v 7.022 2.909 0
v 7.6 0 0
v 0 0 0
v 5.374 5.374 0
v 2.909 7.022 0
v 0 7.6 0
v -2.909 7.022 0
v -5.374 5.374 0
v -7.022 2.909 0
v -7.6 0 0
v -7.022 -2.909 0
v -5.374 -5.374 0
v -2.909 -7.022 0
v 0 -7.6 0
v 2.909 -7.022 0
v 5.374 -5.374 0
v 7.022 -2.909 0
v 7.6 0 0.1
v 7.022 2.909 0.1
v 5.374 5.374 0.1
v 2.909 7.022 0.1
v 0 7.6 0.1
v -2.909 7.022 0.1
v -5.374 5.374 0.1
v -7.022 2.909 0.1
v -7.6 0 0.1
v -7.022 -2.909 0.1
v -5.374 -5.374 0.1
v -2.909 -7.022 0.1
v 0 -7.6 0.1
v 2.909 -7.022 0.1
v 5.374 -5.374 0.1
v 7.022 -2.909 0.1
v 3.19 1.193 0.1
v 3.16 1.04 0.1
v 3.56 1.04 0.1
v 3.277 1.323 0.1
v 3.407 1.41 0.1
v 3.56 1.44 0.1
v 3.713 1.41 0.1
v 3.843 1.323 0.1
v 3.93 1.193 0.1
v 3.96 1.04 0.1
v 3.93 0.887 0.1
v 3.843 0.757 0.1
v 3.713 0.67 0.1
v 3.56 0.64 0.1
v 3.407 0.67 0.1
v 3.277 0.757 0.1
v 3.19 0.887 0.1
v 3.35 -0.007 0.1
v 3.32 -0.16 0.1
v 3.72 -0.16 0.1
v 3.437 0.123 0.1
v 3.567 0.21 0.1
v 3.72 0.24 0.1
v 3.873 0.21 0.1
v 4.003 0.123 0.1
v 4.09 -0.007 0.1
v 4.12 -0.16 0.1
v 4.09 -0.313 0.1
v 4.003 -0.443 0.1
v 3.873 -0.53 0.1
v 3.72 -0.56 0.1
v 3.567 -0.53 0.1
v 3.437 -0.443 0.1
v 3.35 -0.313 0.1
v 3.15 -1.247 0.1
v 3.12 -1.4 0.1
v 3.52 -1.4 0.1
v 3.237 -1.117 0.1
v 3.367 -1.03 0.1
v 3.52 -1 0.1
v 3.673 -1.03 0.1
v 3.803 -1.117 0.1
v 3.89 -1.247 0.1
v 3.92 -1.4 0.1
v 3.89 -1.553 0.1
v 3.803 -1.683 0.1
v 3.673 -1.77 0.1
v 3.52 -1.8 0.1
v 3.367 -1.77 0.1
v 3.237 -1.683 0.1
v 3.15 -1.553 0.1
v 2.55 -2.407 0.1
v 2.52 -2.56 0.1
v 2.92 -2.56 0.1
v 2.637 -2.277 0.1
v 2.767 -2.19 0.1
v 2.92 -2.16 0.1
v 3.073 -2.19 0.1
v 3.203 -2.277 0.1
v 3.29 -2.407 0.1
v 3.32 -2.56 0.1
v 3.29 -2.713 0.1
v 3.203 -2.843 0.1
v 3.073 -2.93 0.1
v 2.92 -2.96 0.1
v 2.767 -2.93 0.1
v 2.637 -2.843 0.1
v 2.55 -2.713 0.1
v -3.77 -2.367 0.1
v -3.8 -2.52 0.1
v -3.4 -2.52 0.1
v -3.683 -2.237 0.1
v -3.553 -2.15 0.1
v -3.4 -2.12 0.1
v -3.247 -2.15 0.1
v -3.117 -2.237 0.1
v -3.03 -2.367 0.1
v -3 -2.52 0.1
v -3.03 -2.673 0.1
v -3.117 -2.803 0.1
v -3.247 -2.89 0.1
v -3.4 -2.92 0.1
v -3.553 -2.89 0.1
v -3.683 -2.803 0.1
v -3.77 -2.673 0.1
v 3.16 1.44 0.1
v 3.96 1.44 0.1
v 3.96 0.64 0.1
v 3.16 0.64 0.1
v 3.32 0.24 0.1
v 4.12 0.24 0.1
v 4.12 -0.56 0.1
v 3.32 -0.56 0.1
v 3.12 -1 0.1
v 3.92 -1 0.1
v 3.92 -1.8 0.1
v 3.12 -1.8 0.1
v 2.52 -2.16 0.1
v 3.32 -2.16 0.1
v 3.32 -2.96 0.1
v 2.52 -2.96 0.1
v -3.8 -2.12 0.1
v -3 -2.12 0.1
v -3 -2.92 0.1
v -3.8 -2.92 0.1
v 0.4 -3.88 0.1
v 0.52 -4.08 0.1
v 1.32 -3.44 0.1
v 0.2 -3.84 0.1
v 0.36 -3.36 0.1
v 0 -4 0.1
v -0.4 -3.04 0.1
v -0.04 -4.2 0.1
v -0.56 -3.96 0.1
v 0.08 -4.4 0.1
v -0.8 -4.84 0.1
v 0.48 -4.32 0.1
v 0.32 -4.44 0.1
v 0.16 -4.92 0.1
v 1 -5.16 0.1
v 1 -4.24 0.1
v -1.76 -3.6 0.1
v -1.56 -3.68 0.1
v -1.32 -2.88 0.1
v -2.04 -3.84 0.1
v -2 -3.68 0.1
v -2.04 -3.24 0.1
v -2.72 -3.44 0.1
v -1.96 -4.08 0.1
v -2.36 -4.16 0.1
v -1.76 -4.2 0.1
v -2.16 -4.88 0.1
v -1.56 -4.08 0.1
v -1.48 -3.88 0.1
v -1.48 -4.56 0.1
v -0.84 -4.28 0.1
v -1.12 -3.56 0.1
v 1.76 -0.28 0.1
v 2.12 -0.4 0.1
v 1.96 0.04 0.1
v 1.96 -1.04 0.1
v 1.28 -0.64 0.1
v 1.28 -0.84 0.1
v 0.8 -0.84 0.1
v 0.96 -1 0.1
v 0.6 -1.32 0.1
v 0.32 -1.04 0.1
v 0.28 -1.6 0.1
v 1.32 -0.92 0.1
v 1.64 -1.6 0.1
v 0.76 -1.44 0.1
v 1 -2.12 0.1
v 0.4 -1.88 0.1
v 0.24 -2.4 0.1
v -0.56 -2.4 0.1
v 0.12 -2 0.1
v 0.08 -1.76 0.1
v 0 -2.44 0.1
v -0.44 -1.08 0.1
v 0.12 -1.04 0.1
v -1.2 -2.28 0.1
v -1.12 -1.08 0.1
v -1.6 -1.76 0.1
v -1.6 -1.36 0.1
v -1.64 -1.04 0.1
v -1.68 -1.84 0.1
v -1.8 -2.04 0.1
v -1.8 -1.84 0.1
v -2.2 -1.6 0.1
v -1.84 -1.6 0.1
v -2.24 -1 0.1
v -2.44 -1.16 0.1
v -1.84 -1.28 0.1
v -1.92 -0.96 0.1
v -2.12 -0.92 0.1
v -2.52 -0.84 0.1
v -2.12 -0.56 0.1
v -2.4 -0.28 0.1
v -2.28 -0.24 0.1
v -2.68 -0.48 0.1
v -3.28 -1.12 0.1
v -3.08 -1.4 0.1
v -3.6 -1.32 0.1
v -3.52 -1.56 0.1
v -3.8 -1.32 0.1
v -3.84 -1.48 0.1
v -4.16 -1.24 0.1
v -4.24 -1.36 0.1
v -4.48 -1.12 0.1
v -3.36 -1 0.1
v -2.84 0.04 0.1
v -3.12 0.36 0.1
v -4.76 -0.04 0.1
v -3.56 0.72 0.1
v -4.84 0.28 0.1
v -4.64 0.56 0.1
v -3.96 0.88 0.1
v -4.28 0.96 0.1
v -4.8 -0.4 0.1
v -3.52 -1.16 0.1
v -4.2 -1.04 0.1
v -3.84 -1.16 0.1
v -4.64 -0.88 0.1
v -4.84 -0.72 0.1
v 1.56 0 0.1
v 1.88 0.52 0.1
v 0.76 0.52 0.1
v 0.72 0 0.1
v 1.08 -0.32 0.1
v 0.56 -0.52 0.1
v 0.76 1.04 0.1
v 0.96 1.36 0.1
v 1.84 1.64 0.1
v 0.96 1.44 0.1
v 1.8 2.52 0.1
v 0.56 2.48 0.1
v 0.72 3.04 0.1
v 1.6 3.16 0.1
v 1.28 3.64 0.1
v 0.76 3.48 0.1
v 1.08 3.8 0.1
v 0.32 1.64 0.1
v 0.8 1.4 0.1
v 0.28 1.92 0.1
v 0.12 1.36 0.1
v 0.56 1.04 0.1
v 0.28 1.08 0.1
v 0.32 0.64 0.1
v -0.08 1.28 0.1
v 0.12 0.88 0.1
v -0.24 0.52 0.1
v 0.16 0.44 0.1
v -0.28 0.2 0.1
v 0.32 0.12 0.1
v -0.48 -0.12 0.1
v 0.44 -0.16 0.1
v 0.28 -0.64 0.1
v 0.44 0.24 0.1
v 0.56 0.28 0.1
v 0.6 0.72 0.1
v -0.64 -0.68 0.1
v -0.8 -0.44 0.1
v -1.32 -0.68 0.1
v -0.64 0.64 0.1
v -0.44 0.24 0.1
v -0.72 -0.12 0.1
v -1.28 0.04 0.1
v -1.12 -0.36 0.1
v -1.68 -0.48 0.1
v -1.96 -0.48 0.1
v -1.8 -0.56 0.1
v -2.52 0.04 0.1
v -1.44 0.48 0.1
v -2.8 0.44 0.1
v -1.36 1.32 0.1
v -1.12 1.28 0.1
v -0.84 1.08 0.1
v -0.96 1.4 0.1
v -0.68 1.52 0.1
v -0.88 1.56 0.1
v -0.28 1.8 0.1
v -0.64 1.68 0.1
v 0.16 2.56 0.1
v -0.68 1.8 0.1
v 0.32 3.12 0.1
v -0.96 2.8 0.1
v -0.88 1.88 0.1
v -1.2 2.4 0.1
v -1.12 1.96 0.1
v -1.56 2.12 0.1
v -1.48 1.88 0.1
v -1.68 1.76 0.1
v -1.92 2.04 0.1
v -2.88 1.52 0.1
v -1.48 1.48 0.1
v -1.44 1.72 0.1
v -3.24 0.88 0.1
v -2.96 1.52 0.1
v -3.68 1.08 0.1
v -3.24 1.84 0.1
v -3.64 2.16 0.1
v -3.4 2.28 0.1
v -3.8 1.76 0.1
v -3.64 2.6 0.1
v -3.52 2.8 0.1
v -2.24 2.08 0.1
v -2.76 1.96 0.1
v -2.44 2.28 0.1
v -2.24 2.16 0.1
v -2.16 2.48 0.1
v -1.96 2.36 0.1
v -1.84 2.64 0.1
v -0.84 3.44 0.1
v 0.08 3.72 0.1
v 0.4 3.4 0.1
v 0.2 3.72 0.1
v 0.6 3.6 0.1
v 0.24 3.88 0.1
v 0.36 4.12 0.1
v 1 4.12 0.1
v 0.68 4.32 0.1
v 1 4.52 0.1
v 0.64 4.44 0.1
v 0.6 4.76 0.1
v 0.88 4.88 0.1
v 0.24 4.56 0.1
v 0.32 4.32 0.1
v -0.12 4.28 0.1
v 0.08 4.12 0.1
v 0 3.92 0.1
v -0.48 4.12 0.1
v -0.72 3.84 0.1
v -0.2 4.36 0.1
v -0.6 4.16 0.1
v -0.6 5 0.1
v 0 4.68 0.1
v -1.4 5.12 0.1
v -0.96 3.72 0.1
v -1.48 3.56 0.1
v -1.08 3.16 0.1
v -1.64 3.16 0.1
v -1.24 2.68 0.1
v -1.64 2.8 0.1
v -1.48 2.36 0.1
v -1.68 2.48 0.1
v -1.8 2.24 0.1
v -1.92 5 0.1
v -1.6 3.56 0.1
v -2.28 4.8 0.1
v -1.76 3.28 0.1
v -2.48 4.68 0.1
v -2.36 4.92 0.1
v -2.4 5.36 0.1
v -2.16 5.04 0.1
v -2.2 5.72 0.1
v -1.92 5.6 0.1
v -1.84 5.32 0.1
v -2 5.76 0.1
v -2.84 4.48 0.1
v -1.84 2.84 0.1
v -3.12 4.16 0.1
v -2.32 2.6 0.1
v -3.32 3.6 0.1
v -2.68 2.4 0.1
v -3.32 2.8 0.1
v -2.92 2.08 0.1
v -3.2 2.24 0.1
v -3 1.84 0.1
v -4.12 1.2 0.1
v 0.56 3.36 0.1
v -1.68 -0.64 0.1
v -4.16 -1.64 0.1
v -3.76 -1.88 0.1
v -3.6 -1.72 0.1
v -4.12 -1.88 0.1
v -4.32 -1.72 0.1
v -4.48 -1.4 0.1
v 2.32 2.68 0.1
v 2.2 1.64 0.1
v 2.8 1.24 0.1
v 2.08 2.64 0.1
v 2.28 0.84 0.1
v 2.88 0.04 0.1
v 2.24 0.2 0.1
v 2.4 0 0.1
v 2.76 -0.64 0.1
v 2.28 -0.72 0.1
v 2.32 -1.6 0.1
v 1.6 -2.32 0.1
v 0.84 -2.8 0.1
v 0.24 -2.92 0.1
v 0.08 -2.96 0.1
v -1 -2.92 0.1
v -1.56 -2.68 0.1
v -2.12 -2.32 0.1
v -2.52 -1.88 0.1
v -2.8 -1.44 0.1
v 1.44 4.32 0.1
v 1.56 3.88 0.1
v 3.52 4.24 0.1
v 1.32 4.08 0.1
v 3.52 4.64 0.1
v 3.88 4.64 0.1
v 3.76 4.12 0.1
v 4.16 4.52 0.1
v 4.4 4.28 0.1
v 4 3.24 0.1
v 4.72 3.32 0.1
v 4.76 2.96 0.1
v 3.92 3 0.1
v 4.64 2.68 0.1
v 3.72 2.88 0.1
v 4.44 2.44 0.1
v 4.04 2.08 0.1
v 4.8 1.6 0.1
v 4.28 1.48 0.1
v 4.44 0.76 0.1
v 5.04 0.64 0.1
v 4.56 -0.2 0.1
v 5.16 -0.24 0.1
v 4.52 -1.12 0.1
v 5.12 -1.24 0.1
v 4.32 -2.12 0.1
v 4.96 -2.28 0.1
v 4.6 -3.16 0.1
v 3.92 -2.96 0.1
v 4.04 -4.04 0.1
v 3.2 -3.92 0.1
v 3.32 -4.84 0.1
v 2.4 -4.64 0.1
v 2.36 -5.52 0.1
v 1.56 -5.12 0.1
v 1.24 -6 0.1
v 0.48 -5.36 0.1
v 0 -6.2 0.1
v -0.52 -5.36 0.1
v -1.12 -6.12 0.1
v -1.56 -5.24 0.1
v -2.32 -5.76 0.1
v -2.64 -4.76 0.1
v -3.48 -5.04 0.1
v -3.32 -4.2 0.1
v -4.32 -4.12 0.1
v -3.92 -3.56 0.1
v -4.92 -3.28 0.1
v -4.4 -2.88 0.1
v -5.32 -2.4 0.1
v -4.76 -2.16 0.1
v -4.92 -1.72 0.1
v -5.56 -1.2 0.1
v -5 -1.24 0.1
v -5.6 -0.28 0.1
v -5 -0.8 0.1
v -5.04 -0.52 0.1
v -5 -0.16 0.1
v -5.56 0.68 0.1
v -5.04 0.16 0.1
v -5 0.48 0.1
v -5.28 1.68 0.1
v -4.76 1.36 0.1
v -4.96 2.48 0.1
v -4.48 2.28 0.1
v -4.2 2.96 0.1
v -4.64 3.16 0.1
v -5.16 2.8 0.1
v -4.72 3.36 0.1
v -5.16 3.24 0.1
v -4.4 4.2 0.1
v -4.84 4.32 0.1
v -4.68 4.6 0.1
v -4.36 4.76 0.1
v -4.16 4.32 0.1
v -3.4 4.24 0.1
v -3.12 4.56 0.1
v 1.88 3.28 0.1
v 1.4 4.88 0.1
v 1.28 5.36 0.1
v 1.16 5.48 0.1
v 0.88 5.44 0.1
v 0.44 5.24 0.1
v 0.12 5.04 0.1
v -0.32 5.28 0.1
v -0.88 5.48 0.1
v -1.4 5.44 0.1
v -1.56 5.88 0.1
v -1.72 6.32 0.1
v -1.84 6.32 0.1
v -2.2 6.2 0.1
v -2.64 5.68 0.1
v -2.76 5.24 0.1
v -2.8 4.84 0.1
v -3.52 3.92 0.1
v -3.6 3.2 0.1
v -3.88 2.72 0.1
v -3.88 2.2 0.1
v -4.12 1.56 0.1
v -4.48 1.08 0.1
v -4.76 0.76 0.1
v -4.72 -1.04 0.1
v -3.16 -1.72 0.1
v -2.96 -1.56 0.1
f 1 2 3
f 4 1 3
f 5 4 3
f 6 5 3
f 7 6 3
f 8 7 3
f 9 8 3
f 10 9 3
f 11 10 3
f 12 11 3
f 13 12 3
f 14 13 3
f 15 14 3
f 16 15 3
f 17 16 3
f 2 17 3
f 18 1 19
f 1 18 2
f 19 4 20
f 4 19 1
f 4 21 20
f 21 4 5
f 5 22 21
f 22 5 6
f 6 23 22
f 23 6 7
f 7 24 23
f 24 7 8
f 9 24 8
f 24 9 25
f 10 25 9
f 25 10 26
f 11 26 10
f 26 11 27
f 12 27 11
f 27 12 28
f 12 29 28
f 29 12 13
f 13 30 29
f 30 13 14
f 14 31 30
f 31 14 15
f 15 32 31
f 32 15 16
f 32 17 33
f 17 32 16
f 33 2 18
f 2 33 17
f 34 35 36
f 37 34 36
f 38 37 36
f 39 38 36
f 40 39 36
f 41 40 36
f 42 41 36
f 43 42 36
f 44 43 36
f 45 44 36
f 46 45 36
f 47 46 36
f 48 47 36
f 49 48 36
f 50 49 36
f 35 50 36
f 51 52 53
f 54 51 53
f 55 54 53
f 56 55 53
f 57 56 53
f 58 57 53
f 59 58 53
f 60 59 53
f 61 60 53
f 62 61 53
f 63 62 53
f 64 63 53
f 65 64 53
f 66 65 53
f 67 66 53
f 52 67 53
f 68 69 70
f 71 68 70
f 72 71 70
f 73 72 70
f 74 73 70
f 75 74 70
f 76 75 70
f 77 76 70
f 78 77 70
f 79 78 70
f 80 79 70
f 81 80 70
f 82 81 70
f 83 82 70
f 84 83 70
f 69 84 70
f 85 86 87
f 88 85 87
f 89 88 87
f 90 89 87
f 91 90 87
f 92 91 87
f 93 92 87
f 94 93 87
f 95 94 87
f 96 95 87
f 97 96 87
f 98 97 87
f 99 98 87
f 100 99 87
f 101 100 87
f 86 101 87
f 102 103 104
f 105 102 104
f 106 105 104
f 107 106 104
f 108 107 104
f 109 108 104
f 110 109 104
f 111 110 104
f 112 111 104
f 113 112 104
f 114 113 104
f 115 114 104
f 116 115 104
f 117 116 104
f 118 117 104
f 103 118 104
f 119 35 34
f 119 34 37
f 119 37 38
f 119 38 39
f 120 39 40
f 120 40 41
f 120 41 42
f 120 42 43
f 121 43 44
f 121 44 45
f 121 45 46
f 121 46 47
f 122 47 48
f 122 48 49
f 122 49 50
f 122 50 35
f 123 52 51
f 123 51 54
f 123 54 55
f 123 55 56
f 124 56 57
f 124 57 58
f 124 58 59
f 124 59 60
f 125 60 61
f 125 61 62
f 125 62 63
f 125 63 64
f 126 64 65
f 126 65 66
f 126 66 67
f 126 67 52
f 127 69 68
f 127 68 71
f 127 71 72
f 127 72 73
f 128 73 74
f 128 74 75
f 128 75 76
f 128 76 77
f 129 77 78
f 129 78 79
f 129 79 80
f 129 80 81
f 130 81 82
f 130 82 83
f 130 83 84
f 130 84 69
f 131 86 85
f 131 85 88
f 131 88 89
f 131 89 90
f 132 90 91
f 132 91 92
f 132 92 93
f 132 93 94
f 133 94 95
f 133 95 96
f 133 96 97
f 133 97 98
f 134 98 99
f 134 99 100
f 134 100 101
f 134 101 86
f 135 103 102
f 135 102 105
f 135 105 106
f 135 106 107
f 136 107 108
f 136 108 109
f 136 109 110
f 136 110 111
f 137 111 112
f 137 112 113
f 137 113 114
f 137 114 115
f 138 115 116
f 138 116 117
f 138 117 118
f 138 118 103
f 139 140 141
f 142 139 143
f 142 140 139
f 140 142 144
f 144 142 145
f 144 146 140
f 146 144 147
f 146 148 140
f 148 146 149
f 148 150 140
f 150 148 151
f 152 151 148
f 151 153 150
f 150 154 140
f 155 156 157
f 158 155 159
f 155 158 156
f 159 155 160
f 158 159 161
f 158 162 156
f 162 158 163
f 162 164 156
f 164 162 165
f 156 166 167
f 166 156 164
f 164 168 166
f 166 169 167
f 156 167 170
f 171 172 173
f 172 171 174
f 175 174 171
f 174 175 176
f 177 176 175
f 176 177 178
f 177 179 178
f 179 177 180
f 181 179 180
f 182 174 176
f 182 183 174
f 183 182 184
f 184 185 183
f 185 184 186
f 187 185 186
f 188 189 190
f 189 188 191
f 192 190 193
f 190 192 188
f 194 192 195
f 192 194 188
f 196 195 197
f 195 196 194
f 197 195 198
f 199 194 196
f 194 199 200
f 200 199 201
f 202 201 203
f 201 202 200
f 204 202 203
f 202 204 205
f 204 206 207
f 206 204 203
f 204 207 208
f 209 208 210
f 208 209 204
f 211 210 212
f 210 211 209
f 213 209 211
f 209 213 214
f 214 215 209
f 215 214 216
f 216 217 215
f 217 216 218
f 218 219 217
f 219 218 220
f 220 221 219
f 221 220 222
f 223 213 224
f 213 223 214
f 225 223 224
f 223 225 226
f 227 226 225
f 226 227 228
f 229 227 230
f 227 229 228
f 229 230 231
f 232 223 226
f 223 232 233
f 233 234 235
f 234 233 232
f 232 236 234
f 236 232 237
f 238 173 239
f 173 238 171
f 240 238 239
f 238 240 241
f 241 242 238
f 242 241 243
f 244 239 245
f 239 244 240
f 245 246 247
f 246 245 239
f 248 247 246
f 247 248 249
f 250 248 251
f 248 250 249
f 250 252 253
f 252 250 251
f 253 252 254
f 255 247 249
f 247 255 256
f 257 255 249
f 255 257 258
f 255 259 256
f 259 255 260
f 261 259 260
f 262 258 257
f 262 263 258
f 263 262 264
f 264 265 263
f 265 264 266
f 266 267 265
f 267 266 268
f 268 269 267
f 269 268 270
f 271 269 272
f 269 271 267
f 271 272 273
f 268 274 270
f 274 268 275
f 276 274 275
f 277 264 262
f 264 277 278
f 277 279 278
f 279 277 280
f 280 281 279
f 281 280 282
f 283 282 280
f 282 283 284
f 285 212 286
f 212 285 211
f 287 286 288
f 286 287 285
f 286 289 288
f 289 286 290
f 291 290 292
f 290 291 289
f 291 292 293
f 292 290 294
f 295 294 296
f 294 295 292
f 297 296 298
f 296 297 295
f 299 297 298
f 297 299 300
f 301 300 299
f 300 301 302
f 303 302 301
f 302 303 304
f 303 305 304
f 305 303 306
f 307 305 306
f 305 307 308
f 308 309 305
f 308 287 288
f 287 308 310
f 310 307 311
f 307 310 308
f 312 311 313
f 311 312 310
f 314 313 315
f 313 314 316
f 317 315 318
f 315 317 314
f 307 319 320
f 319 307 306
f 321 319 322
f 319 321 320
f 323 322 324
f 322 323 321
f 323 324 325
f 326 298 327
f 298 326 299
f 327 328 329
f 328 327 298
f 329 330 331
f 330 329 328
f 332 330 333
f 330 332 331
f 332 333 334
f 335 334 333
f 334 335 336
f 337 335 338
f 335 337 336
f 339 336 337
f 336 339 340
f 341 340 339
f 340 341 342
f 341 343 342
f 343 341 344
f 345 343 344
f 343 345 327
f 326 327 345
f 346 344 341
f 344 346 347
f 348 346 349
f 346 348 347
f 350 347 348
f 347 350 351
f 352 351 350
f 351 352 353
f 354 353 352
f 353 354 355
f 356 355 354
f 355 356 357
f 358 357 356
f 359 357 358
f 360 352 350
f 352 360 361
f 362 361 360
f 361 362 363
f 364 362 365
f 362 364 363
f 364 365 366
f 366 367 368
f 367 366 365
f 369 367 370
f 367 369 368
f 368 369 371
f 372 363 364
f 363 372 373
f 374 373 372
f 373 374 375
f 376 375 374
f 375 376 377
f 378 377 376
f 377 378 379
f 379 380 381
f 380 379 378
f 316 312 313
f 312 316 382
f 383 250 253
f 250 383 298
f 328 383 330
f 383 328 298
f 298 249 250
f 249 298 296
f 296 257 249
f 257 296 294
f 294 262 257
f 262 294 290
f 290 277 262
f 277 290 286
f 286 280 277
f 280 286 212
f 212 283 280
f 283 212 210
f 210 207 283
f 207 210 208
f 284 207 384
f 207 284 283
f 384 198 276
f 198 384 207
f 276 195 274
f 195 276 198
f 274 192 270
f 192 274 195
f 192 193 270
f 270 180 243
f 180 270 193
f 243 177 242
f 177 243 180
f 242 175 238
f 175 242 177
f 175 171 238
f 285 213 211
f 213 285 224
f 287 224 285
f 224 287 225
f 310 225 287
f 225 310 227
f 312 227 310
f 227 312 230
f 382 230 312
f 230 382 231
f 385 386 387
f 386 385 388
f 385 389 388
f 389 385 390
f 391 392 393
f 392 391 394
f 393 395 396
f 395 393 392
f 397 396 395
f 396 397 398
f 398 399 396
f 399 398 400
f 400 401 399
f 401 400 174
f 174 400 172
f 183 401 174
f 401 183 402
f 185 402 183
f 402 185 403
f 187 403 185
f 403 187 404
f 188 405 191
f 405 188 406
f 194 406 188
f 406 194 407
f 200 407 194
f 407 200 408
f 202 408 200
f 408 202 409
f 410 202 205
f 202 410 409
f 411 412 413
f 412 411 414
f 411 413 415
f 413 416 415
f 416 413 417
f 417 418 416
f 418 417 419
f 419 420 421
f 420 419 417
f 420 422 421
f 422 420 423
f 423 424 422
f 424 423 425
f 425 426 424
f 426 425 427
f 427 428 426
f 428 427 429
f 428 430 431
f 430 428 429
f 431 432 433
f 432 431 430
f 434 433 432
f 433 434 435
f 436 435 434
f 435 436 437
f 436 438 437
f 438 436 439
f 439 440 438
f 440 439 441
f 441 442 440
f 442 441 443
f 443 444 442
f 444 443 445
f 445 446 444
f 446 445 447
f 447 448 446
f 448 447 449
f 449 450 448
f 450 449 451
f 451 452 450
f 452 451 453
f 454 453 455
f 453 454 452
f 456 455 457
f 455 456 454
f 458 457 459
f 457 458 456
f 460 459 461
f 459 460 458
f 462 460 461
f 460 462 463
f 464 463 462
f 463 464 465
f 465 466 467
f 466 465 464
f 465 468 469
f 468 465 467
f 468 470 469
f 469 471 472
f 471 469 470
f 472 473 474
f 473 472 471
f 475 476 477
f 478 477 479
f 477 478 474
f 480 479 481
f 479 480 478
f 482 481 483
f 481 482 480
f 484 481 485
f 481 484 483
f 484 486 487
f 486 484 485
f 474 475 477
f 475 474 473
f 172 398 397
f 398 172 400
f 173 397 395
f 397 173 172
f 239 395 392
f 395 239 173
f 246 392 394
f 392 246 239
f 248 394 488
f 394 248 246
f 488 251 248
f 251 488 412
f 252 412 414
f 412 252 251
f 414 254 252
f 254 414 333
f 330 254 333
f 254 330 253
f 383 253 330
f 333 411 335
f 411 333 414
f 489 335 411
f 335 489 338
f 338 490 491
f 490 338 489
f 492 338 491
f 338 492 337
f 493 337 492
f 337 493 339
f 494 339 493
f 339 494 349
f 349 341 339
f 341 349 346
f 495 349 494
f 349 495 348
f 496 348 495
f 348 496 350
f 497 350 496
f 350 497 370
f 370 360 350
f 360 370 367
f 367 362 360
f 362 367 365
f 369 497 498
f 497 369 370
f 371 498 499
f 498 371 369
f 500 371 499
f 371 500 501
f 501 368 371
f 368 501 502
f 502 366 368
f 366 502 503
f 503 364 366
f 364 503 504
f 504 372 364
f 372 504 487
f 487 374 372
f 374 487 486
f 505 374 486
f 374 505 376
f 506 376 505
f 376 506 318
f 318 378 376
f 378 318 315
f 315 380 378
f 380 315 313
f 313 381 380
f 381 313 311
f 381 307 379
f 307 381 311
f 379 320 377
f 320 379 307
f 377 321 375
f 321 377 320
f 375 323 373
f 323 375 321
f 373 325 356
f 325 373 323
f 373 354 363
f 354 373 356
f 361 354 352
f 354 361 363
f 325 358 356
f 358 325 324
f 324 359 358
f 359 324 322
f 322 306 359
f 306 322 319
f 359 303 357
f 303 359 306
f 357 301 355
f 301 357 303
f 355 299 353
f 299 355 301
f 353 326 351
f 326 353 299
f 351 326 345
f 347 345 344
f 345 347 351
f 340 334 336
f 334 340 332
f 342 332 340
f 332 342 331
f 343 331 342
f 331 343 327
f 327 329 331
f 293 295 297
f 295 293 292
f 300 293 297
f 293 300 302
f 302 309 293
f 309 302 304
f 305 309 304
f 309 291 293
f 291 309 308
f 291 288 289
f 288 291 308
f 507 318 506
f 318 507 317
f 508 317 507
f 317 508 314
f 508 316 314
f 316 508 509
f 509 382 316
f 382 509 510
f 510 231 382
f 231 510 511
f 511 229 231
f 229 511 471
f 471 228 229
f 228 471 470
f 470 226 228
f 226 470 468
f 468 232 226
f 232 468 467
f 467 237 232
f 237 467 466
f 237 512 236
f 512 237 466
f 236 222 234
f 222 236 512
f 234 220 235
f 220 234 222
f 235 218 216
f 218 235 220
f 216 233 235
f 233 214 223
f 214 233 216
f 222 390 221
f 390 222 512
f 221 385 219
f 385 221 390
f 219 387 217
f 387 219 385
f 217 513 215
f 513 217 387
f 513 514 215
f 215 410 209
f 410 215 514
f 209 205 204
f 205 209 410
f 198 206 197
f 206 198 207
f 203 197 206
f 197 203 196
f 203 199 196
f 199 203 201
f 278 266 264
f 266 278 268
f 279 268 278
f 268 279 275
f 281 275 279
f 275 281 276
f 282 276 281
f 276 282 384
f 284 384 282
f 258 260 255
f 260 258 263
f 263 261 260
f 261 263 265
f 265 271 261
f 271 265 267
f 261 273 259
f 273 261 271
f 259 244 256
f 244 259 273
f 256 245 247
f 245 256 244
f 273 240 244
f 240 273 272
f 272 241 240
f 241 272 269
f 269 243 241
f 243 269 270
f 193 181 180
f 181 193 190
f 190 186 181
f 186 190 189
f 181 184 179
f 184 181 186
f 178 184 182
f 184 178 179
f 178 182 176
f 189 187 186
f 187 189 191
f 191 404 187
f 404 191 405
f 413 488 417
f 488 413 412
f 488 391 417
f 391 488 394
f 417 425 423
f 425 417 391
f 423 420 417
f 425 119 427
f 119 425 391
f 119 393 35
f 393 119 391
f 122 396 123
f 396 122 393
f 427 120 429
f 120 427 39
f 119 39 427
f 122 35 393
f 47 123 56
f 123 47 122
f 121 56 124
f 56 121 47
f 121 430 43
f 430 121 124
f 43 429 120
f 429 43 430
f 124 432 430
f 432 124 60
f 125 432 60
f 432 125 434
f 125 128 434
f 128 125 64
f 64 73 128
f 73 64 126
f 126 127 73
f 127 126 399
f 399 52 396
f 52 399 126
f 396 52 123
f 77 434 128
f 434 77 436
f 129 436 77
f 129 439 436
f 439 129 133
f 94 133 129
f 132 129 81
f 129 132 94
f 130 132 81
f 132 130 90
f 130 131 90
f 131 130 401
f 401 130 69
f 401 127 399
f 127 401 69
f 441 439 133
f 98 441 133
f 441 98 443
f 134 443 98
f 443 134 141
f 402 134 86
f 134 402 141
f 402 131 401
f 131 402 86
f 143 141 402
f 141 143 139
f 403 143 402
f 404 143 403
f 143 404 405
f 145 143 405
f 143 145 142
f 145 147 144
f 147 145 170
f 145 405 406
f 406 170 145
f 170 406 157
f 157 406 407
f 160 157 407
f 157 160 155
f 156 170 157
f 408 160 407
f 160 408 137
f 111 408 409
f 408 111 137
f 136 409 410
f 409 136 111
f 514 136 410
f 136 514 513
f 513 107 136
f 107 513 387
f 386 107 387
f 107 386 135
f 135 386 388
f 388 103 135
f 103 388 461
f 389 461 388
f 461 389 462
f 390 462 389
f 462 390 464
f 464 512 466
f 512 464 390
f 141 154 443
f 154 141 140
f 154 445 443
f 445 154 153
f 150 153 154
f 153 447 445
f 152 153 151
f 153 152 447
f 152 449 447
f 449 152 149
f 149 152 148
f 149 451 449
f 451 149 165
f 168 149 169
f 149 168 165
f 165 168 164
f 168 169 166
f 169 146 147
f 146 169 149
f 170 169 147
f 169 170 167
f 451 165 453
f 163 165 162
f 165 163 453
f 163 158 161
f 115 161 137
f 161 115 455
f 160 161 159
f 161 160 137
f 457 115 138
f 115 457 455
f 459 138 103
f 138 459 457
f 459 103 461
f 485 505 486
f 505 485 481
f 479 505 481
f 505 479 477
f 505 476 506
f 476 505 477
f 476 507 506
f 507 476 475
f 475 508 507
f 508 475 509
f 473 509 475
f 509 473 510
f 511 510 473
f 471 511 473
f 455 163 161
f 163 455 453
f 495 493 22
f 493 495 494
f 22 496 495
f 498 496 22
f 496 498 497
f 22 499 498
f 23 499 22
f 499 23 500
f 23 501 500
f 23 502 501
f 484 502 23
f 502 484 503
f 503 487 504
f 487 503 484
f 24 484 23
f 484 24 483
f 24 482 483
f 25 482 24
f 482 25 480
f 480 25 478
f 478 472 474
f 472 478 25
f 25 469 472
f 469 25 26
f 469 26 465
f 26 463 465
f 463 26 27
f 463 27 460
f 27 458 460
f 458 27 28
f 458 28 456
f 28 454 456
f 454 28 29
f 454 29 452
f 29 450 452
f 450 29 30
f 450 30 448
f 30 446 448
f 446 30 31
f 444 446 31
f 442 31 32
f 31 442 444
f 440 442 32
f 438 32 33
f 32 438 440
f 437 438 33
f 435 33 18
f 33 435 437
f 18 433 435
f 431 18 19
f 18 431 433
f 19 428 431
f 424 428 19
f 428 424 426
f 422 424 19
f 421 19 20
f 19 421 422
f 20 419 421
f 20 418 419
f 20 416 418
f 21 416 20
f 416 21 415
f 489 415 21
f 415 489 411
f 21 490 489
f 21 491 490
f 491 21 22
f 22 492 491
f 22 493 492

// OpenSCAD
use <../lib.scad>
use <../p/4-4cylc3.scad>
use <../p/4-4ering.scad>
use <s/4650854ds01.scad>
function ldraw_lib__4650854g() = [
// 0 Sticker  1.9 x  1.9 Round with Horse Head in Horseshoe
// 0 Name: 4650854g.dat
// 0 Author: Takeshi Takahashi [RainbowDolphin]
// 0 !LDRAW_ORG Part UPDATE 2024-08
// 0 !LICENSE Licensed under CC BY 4.0 : see CAreadme.txt
// 
// 0 BFC CERTIFY CCW
  [0,"BFC","CERTIFY"],
  [0,"BFC","CCW"],
// 
// 0 !KEYWORDS Bricklink 3185stk01, Brickowl 384632, camp, Rebrickable 10099435
// 0 !KEYWORDS Riding, Set 3185, Stable
// 
// 0 !HISTORY 2024-09-30 [OrionP] Official Update 2024-08
// 
// 1 16 0 0 0 19 0 0 0 -0.25 0 0 0 19 4-4cylc3.dat
  [1,16,0,0,0,19,0,0,0,-0.25,0,0,0,19, ldraw_lib__4_4cylc3()],
// 1 30 0 -.25 0 19 0 0 0 1 0 0 0 19 4-4ering.dat
  [1,30,0,-.25,0,19,0,0,0,1,0,0,0,19, ldraw_lib__4_4ering()],
// 1 16 0 -.25 0 -1 0 0 0 1 0 0 0 1 s\4650854ds01.dat
  [1,16,0,-.25,0,-1,0,0,0,1,0,0,0,1, ldraw_lib__s__4650854ds01()],
// 4 30 0 -.25 19 -.8 -.25 13.2 .3 -.25 12.6 1.1 -.25 13.1
  [4,30,0,-.25,19,-.8,-.25,13.2,.3,-.25,12.6,1.1,-.25,13.1],
// 3 30 0 -.25 19 -2.2 -.25 13.7 -.8 -.25 13.2
  [3,30,0,-.25,19,-2.2,-.25,13.7,-.8,-.25,13.2],
// 4 30 -3.5 -.25 13.6 -2.2 -.25 13.7 0 -.25 19 -3.9 -.25 14.7
  [4,30,-3.5,-.25,13.6,-2.2,-.25,13.7,0,-.25,19,-3.9,-.25,14.7],
// 3 30 0 -.25 19 -4.3 -.25 15.8 -3.9 -.25 14.7
  [3,30,0,-.25,19,-4.3,-.25,15.8,-3.9,-.25,14.7],
// 4 30 -4.6 -.25 15.8 -4.3 -.25 15.8 0 -.25 19 -7.2713 -.25 17.5541
  [4,30,-4.6,-.25,15.8,-4.3,-.25,15.8,0,-.25,19,-7.2713,-.25,17.5541],
// 3 30 -7.2713 -.25 17.5541 -5.5 -.25 15.5 -4.6 -.25 15.8
  [3,30,-7.2713,-.25,17.5541,-5.5,-.25,15.5,-4.6,-.25,15.8],
// 3 30 -7.2713 -.25 17.5541 -6.6 -.25 14.2 -5.5 -.25 15.5
  [3,30,-7.2713,-.25,17.5541,-6.6,-.25,14.2,-5.5,-.25,15.5],
// 4 30 -6.9 -.25 13.1 -6.6 -.25 14.2 -7.2713 -.25 17.5541 -10.9 -.25 11.9
  [4,30,-6.9,-.25,13.1,-6.6,-.25,14.2,-7.2713,-.25,17.5541,-10.9,-.25,11.9],
// 4 30 -7 -.25 12.1 -6.9 -.25 13.1 -10.9 -.25 11.9 -7.8 -.25 11.4
  [4,30,-7,-.25,12.1,-6.9,-.25,13.1,-10.9,-.25,11.9,-7.8,-.25,11.4],
// 4 30 -10.9 -.25 11.9 -7.2713 -.25 17.5541 -13.4349 -.25 13.4349 -11.7 -.25 11.5
  [4,30,-10.9,-.25,11.9,-7.2713,-.25,17.5541,-13.4349,-.25,13.4349,-11.7,-.25,11.5],
// 3 30 -13.4349 -.25 13.4349 -12.1 -.25 10.8 -11.7 -.25 11.5
  [3,30,-13.4349,-.25,13.4349,-12.1,-.25,10.8,-11.7,-.25,11.5],
// 4 30 -12.9 -.25 8.1 -12.1 -.25 10.8 -13.4349 -.25 13.4349 -17.5541 -.25 7.2713
  [4,30,-12.9,-.25,8.1,-12.1,-.25,10.8,-13.4349,-.25,13.4349,-17.5541,-.25,7.2713],
// 3 30 -12.9 -.25 8.1 -17.5541 -.25 7.2713 -12.9 -.25 7
  [3,30,-12.9,-.25,8.1,-17.5541,-.25,7.2713,-12.9,-.25,7],
// 4 30 -12.4 -.25 6.2 -12.9 -.25 7 -17.5541 -.25 7.2713 -13.2 -.25 4.2
  [4,30,-12.4,-.25,6.2,-12.9,-.25,7,-17.5541,-.25,7.2713,-13.2,-.25,4.2],
// 4 30 -13.9 -.25 1.7 -13.2 -.25 4.2 -17.5541 -.25 7.2713 -19 -.25 0
  [4,30,-13.9,-.25,1.7,-13.2,-.25,4.2,-17.5541,-.25,7.2713,-19,-.25,0],
// 3 30 -13.9 -.25 1.7 -19 -.25 0 -14 -.25 -.7
  [3,30,-13.9,-.25,1.7,-19,-.25,0,-14,-.25,-.7],
// 4 30 -13.9 -.25 -3 -14 -.25 -.7 -19 -.25 0 -17.5541 -.25 -7.2713
  [4,30,-13.9,-.25,-3,-14,-.25,-.7,-19,-.25,0,-17.5541,-.25,-7.2713],
// 3 30 -13.9 -.25 -3 -17.5541 -.25 -7.2713 -13.3 -.25 -6
  [3,30,-13.9,-.25,-3,-17.5541,-.25,-7.2713,-13.3,-.25,-6],
// 4 30 -12.3 -.25 -8.2 -13.3 -.25 -6 -17.5541 -.25 -7.2713 -13.4349 -.25 -13.4349
  [4,30,-12.3,-.25,-8.2,-13.3,-.25,-6,-17.5541,-.25,-7.2713,-13.4349,-.25,-13.4349],
// 3 30 -12.3 -.25 -8.2 -13.4349 -.25 -13.4349 -10.8 -.25 -10.3
  [3,30,-12.3,-.25,-8.2,-13.4349,-.25,-13.4349,-10.8,-.25,-10.3],
// 4 30 -8.7 -.25 -12.6 -10.8 -.25 -10.3 -13.4349 -.25 -13.4349 -7.2713 -.25 -17.5541
  [4,30,-8.7,-.25,-12.6,-10.8,-.25,-10.3,-13.4349,-.25,-13.4349,-7.2713,-.25,-17.5541],
// 3 30 -8.7 -.25 -12.6 -7.2713 -.25 -17.5541 -5.8 -.25 -14.4
  [3,30,-8.7,-.25,-12.6,-7.2713,-.25,-17.5541,-5.8,-.25,-14.4],
// 4 30 -2.8 -.25 -15.3 -5.8 -.25 -14.4 -7.2713 -.25 -17.5541 0 -.25 -19
  [4,30,-2.8,-.25,-15.3,-5.8,-.25,-14.4,-7.2713,-.25,-17.5541,0,-.25,-19],
// 3 30 -2.8 -.25 -15.3 0 -.25 -19 0 -.25 -15.5
  [3,30,-2.8,-.25,-15.3,0,-.25,-19,0,-.25,-15.5],
// 4 30 3.1 -.25 -15 0 -.25 -15.5 0 -.25 -19 7.2713 -.25 -17.5541
  [4,30,3.1,-.25,-15,0,-.25,-15.5,0,-.25,-19,7.2713,-.25,-17.5541],
// 3 30 5.9 -.25 -13.8 3.1 -.25 -15 7.2713 -.25 -17.5541
  [3,30,5.9,-.25,-13.8,3.1,-.25,-15,7.2713,-.25,-17.5541],
// 4 30 8.3 -.25 -12.1 5.9 -.25 -13.8 7.2713 -.25 -17.5541 13.4349 -.25 -13.4349
  [4,30,8.3,-.25,-12.1,5.9,-.25,-13.8,7.2713,-.25,-17.5541,13.4349,-.25,-13.4349],
// 3 30 10.1 -.25 -10.1 8.3 -.25 -12.1 13.4349 -.25 -13.4349
  [3,30,10.1,-.25,-10.1,8.3,-.25,-12.1,13.4349,-.25,-13.4349],
// 4 30 11.5 -.25 -7.9 10.1 -.25 -10.1 13.4349 -.25 -13.4349 17.5541 -.25 -7.2713
  [4,30,11.5,-.25,-7.9,10.1,-.25,-10.1,13.4349,-.25,-13.4349,17.5541,-.25,-7.2713],
// 3 30 12.4 -.25 -5.7 11.5 -.25 -7.9 17.5541 -.25 -7.2713
  [3,30,12.4,-.25,-5.7,11.5,-.25,-7.9,17.5541,-.25,-7.2713],
// 4 30 12.8 -.25 -3.1 12.4 -.25 -5.7 17.5541 -.25 -7.2713 19 -.25 0
  [4,30,12.8,-.25,-3.1,12.4,-.25,-5.7,17.5541,-.25,-7.2713,19,-.25,0],
// 3 30 19 -.25 0 12.9 -.25 -.6 12.8 -.25 -3.1
  [3,30,19,-.25,0,12.9,-.25,-.6,12.8,-.25,-3.1],
// 4 30 12.6 -.25 1.6 12.9 -.25 -.6 19 -.25 0 17.5541 -.25 7.2713
  [4,30,12.6,-.25,1.6,12.9,-.25,-.6,19,-.25,0,17.5541,-.25,7.2713],
// 3 30 17.5541 -.25 7.2713 12 -.25 4 12.6 -.25 1.6
  [3,30,17.5541,-.25,7.2713,12,-.25,4,12.6,-.25,1.6],
// 4 30 11.1 -.25 6.1 12 -.25 4 17.5541 -.25 7.2713 11.6 -.25 6.7
  [4,30,11.1,-.25,6.1,12,-.25,4,17.5541,-.25,7.2713,11.6,-.25,6.7],
// 3 30 11.9 -.25 7.4 11.6 -.25 6.7 17.5541 -.25 7.2713
  [3,30,11.9,-.25,7.4,11.6,-.25,6.7,17.5541,-.25,7.2713],
// 4 30 11.8 -.25 8.3 11.9 -.25 7.4 17.5541 -.25 7.2713 13.4349 -.25 13.4349
  [4,30,11.8,-.25,8.3,11.9,-.25,7.4,17.5541,-.25,7.2713,13.4349,-.25,13.4349],
// 3 30 13.4349 -.25 13.4349 11 -.25 10.7 11.8 -.25 8.3
  [3,30,13.4349,-.25,13.4349,11,-.25,10.7,11.8,-.25,8.3],
// 3 30 13.4349 -.25 13.4349 10.4 -.25 11.3 11 -.25 10.7
  [3,30,13.4349,-.25,13.4349,10.4,-.25,11.3,11,-.25,10.7],
// 3 30 13.4349 -.25 13.4349 9.7 -.25 11.6 10.4 -.25 11.3
  [3,30,13.4349,-.25,13.4349,9.7,-.25,11.6,10.4,-.25,11.3],
// 4 30 8.8 -.25 11.6 9.7 -.25 11.6 13.4349 -.25 13.4349 7.2713 -.25 17.5541
  [4,30,8.8,-.25,11.6,9.7,-.25,11.6,13.4349,-.25,13.4349,7.2713,-.25,17.5541],
// 4 30 3.6 -.25 10.8 8.8 -.25 11.6 7.2713 -.25 17.5541 3.5 -.25 12.2
  [4,30,3.6,-.25,10.8,8.8,-.25,11.6,7.2713,-.25,17.5541,3.5,-.25,12.2],
// 3 30 7.2713 -.25 17.5541 3.2 -.25 13.4 3.5 -.25 12.2
  [3,30,7.2713,-.25,17.5541,3.2,-.25,13.4,3.5,-.25,12.2],
// 4 30 2.9 -.25 13.7 3.2 -.25 13.4 7.2713 -.25 17.5541 0 -.25 19
  [4,30,2.9,-.25,13.7,3.2,-.25,13.4,7.2713,-.25,17.5541,0,-.25,19],
// 3 30 0 -.25 19 2.2 -.25 13.6 2.9 -.25 13.7
  [3,30,0,-.25,19,2.2,-.25,13.6,2.9,-.25,13.7],
// 3 30 0 -.25 19 1.1 -.25 13.1 2.2 -.25 13.6
  [3,30,0,-.25,19,1.1,-.25,13.1,2.2,-.25,13.6],
];
module ldraw_lib__4650854g(step=0, col=false, unit=2/5, alt=false, line=0.2, solid=!$preview)
    makepoly(ldraw_lib__4650854g(), step=step, col=col, unit=unit, alt=alt, line=line, solid=solid);
ldraw_lib__4650854g(line=0.2);
